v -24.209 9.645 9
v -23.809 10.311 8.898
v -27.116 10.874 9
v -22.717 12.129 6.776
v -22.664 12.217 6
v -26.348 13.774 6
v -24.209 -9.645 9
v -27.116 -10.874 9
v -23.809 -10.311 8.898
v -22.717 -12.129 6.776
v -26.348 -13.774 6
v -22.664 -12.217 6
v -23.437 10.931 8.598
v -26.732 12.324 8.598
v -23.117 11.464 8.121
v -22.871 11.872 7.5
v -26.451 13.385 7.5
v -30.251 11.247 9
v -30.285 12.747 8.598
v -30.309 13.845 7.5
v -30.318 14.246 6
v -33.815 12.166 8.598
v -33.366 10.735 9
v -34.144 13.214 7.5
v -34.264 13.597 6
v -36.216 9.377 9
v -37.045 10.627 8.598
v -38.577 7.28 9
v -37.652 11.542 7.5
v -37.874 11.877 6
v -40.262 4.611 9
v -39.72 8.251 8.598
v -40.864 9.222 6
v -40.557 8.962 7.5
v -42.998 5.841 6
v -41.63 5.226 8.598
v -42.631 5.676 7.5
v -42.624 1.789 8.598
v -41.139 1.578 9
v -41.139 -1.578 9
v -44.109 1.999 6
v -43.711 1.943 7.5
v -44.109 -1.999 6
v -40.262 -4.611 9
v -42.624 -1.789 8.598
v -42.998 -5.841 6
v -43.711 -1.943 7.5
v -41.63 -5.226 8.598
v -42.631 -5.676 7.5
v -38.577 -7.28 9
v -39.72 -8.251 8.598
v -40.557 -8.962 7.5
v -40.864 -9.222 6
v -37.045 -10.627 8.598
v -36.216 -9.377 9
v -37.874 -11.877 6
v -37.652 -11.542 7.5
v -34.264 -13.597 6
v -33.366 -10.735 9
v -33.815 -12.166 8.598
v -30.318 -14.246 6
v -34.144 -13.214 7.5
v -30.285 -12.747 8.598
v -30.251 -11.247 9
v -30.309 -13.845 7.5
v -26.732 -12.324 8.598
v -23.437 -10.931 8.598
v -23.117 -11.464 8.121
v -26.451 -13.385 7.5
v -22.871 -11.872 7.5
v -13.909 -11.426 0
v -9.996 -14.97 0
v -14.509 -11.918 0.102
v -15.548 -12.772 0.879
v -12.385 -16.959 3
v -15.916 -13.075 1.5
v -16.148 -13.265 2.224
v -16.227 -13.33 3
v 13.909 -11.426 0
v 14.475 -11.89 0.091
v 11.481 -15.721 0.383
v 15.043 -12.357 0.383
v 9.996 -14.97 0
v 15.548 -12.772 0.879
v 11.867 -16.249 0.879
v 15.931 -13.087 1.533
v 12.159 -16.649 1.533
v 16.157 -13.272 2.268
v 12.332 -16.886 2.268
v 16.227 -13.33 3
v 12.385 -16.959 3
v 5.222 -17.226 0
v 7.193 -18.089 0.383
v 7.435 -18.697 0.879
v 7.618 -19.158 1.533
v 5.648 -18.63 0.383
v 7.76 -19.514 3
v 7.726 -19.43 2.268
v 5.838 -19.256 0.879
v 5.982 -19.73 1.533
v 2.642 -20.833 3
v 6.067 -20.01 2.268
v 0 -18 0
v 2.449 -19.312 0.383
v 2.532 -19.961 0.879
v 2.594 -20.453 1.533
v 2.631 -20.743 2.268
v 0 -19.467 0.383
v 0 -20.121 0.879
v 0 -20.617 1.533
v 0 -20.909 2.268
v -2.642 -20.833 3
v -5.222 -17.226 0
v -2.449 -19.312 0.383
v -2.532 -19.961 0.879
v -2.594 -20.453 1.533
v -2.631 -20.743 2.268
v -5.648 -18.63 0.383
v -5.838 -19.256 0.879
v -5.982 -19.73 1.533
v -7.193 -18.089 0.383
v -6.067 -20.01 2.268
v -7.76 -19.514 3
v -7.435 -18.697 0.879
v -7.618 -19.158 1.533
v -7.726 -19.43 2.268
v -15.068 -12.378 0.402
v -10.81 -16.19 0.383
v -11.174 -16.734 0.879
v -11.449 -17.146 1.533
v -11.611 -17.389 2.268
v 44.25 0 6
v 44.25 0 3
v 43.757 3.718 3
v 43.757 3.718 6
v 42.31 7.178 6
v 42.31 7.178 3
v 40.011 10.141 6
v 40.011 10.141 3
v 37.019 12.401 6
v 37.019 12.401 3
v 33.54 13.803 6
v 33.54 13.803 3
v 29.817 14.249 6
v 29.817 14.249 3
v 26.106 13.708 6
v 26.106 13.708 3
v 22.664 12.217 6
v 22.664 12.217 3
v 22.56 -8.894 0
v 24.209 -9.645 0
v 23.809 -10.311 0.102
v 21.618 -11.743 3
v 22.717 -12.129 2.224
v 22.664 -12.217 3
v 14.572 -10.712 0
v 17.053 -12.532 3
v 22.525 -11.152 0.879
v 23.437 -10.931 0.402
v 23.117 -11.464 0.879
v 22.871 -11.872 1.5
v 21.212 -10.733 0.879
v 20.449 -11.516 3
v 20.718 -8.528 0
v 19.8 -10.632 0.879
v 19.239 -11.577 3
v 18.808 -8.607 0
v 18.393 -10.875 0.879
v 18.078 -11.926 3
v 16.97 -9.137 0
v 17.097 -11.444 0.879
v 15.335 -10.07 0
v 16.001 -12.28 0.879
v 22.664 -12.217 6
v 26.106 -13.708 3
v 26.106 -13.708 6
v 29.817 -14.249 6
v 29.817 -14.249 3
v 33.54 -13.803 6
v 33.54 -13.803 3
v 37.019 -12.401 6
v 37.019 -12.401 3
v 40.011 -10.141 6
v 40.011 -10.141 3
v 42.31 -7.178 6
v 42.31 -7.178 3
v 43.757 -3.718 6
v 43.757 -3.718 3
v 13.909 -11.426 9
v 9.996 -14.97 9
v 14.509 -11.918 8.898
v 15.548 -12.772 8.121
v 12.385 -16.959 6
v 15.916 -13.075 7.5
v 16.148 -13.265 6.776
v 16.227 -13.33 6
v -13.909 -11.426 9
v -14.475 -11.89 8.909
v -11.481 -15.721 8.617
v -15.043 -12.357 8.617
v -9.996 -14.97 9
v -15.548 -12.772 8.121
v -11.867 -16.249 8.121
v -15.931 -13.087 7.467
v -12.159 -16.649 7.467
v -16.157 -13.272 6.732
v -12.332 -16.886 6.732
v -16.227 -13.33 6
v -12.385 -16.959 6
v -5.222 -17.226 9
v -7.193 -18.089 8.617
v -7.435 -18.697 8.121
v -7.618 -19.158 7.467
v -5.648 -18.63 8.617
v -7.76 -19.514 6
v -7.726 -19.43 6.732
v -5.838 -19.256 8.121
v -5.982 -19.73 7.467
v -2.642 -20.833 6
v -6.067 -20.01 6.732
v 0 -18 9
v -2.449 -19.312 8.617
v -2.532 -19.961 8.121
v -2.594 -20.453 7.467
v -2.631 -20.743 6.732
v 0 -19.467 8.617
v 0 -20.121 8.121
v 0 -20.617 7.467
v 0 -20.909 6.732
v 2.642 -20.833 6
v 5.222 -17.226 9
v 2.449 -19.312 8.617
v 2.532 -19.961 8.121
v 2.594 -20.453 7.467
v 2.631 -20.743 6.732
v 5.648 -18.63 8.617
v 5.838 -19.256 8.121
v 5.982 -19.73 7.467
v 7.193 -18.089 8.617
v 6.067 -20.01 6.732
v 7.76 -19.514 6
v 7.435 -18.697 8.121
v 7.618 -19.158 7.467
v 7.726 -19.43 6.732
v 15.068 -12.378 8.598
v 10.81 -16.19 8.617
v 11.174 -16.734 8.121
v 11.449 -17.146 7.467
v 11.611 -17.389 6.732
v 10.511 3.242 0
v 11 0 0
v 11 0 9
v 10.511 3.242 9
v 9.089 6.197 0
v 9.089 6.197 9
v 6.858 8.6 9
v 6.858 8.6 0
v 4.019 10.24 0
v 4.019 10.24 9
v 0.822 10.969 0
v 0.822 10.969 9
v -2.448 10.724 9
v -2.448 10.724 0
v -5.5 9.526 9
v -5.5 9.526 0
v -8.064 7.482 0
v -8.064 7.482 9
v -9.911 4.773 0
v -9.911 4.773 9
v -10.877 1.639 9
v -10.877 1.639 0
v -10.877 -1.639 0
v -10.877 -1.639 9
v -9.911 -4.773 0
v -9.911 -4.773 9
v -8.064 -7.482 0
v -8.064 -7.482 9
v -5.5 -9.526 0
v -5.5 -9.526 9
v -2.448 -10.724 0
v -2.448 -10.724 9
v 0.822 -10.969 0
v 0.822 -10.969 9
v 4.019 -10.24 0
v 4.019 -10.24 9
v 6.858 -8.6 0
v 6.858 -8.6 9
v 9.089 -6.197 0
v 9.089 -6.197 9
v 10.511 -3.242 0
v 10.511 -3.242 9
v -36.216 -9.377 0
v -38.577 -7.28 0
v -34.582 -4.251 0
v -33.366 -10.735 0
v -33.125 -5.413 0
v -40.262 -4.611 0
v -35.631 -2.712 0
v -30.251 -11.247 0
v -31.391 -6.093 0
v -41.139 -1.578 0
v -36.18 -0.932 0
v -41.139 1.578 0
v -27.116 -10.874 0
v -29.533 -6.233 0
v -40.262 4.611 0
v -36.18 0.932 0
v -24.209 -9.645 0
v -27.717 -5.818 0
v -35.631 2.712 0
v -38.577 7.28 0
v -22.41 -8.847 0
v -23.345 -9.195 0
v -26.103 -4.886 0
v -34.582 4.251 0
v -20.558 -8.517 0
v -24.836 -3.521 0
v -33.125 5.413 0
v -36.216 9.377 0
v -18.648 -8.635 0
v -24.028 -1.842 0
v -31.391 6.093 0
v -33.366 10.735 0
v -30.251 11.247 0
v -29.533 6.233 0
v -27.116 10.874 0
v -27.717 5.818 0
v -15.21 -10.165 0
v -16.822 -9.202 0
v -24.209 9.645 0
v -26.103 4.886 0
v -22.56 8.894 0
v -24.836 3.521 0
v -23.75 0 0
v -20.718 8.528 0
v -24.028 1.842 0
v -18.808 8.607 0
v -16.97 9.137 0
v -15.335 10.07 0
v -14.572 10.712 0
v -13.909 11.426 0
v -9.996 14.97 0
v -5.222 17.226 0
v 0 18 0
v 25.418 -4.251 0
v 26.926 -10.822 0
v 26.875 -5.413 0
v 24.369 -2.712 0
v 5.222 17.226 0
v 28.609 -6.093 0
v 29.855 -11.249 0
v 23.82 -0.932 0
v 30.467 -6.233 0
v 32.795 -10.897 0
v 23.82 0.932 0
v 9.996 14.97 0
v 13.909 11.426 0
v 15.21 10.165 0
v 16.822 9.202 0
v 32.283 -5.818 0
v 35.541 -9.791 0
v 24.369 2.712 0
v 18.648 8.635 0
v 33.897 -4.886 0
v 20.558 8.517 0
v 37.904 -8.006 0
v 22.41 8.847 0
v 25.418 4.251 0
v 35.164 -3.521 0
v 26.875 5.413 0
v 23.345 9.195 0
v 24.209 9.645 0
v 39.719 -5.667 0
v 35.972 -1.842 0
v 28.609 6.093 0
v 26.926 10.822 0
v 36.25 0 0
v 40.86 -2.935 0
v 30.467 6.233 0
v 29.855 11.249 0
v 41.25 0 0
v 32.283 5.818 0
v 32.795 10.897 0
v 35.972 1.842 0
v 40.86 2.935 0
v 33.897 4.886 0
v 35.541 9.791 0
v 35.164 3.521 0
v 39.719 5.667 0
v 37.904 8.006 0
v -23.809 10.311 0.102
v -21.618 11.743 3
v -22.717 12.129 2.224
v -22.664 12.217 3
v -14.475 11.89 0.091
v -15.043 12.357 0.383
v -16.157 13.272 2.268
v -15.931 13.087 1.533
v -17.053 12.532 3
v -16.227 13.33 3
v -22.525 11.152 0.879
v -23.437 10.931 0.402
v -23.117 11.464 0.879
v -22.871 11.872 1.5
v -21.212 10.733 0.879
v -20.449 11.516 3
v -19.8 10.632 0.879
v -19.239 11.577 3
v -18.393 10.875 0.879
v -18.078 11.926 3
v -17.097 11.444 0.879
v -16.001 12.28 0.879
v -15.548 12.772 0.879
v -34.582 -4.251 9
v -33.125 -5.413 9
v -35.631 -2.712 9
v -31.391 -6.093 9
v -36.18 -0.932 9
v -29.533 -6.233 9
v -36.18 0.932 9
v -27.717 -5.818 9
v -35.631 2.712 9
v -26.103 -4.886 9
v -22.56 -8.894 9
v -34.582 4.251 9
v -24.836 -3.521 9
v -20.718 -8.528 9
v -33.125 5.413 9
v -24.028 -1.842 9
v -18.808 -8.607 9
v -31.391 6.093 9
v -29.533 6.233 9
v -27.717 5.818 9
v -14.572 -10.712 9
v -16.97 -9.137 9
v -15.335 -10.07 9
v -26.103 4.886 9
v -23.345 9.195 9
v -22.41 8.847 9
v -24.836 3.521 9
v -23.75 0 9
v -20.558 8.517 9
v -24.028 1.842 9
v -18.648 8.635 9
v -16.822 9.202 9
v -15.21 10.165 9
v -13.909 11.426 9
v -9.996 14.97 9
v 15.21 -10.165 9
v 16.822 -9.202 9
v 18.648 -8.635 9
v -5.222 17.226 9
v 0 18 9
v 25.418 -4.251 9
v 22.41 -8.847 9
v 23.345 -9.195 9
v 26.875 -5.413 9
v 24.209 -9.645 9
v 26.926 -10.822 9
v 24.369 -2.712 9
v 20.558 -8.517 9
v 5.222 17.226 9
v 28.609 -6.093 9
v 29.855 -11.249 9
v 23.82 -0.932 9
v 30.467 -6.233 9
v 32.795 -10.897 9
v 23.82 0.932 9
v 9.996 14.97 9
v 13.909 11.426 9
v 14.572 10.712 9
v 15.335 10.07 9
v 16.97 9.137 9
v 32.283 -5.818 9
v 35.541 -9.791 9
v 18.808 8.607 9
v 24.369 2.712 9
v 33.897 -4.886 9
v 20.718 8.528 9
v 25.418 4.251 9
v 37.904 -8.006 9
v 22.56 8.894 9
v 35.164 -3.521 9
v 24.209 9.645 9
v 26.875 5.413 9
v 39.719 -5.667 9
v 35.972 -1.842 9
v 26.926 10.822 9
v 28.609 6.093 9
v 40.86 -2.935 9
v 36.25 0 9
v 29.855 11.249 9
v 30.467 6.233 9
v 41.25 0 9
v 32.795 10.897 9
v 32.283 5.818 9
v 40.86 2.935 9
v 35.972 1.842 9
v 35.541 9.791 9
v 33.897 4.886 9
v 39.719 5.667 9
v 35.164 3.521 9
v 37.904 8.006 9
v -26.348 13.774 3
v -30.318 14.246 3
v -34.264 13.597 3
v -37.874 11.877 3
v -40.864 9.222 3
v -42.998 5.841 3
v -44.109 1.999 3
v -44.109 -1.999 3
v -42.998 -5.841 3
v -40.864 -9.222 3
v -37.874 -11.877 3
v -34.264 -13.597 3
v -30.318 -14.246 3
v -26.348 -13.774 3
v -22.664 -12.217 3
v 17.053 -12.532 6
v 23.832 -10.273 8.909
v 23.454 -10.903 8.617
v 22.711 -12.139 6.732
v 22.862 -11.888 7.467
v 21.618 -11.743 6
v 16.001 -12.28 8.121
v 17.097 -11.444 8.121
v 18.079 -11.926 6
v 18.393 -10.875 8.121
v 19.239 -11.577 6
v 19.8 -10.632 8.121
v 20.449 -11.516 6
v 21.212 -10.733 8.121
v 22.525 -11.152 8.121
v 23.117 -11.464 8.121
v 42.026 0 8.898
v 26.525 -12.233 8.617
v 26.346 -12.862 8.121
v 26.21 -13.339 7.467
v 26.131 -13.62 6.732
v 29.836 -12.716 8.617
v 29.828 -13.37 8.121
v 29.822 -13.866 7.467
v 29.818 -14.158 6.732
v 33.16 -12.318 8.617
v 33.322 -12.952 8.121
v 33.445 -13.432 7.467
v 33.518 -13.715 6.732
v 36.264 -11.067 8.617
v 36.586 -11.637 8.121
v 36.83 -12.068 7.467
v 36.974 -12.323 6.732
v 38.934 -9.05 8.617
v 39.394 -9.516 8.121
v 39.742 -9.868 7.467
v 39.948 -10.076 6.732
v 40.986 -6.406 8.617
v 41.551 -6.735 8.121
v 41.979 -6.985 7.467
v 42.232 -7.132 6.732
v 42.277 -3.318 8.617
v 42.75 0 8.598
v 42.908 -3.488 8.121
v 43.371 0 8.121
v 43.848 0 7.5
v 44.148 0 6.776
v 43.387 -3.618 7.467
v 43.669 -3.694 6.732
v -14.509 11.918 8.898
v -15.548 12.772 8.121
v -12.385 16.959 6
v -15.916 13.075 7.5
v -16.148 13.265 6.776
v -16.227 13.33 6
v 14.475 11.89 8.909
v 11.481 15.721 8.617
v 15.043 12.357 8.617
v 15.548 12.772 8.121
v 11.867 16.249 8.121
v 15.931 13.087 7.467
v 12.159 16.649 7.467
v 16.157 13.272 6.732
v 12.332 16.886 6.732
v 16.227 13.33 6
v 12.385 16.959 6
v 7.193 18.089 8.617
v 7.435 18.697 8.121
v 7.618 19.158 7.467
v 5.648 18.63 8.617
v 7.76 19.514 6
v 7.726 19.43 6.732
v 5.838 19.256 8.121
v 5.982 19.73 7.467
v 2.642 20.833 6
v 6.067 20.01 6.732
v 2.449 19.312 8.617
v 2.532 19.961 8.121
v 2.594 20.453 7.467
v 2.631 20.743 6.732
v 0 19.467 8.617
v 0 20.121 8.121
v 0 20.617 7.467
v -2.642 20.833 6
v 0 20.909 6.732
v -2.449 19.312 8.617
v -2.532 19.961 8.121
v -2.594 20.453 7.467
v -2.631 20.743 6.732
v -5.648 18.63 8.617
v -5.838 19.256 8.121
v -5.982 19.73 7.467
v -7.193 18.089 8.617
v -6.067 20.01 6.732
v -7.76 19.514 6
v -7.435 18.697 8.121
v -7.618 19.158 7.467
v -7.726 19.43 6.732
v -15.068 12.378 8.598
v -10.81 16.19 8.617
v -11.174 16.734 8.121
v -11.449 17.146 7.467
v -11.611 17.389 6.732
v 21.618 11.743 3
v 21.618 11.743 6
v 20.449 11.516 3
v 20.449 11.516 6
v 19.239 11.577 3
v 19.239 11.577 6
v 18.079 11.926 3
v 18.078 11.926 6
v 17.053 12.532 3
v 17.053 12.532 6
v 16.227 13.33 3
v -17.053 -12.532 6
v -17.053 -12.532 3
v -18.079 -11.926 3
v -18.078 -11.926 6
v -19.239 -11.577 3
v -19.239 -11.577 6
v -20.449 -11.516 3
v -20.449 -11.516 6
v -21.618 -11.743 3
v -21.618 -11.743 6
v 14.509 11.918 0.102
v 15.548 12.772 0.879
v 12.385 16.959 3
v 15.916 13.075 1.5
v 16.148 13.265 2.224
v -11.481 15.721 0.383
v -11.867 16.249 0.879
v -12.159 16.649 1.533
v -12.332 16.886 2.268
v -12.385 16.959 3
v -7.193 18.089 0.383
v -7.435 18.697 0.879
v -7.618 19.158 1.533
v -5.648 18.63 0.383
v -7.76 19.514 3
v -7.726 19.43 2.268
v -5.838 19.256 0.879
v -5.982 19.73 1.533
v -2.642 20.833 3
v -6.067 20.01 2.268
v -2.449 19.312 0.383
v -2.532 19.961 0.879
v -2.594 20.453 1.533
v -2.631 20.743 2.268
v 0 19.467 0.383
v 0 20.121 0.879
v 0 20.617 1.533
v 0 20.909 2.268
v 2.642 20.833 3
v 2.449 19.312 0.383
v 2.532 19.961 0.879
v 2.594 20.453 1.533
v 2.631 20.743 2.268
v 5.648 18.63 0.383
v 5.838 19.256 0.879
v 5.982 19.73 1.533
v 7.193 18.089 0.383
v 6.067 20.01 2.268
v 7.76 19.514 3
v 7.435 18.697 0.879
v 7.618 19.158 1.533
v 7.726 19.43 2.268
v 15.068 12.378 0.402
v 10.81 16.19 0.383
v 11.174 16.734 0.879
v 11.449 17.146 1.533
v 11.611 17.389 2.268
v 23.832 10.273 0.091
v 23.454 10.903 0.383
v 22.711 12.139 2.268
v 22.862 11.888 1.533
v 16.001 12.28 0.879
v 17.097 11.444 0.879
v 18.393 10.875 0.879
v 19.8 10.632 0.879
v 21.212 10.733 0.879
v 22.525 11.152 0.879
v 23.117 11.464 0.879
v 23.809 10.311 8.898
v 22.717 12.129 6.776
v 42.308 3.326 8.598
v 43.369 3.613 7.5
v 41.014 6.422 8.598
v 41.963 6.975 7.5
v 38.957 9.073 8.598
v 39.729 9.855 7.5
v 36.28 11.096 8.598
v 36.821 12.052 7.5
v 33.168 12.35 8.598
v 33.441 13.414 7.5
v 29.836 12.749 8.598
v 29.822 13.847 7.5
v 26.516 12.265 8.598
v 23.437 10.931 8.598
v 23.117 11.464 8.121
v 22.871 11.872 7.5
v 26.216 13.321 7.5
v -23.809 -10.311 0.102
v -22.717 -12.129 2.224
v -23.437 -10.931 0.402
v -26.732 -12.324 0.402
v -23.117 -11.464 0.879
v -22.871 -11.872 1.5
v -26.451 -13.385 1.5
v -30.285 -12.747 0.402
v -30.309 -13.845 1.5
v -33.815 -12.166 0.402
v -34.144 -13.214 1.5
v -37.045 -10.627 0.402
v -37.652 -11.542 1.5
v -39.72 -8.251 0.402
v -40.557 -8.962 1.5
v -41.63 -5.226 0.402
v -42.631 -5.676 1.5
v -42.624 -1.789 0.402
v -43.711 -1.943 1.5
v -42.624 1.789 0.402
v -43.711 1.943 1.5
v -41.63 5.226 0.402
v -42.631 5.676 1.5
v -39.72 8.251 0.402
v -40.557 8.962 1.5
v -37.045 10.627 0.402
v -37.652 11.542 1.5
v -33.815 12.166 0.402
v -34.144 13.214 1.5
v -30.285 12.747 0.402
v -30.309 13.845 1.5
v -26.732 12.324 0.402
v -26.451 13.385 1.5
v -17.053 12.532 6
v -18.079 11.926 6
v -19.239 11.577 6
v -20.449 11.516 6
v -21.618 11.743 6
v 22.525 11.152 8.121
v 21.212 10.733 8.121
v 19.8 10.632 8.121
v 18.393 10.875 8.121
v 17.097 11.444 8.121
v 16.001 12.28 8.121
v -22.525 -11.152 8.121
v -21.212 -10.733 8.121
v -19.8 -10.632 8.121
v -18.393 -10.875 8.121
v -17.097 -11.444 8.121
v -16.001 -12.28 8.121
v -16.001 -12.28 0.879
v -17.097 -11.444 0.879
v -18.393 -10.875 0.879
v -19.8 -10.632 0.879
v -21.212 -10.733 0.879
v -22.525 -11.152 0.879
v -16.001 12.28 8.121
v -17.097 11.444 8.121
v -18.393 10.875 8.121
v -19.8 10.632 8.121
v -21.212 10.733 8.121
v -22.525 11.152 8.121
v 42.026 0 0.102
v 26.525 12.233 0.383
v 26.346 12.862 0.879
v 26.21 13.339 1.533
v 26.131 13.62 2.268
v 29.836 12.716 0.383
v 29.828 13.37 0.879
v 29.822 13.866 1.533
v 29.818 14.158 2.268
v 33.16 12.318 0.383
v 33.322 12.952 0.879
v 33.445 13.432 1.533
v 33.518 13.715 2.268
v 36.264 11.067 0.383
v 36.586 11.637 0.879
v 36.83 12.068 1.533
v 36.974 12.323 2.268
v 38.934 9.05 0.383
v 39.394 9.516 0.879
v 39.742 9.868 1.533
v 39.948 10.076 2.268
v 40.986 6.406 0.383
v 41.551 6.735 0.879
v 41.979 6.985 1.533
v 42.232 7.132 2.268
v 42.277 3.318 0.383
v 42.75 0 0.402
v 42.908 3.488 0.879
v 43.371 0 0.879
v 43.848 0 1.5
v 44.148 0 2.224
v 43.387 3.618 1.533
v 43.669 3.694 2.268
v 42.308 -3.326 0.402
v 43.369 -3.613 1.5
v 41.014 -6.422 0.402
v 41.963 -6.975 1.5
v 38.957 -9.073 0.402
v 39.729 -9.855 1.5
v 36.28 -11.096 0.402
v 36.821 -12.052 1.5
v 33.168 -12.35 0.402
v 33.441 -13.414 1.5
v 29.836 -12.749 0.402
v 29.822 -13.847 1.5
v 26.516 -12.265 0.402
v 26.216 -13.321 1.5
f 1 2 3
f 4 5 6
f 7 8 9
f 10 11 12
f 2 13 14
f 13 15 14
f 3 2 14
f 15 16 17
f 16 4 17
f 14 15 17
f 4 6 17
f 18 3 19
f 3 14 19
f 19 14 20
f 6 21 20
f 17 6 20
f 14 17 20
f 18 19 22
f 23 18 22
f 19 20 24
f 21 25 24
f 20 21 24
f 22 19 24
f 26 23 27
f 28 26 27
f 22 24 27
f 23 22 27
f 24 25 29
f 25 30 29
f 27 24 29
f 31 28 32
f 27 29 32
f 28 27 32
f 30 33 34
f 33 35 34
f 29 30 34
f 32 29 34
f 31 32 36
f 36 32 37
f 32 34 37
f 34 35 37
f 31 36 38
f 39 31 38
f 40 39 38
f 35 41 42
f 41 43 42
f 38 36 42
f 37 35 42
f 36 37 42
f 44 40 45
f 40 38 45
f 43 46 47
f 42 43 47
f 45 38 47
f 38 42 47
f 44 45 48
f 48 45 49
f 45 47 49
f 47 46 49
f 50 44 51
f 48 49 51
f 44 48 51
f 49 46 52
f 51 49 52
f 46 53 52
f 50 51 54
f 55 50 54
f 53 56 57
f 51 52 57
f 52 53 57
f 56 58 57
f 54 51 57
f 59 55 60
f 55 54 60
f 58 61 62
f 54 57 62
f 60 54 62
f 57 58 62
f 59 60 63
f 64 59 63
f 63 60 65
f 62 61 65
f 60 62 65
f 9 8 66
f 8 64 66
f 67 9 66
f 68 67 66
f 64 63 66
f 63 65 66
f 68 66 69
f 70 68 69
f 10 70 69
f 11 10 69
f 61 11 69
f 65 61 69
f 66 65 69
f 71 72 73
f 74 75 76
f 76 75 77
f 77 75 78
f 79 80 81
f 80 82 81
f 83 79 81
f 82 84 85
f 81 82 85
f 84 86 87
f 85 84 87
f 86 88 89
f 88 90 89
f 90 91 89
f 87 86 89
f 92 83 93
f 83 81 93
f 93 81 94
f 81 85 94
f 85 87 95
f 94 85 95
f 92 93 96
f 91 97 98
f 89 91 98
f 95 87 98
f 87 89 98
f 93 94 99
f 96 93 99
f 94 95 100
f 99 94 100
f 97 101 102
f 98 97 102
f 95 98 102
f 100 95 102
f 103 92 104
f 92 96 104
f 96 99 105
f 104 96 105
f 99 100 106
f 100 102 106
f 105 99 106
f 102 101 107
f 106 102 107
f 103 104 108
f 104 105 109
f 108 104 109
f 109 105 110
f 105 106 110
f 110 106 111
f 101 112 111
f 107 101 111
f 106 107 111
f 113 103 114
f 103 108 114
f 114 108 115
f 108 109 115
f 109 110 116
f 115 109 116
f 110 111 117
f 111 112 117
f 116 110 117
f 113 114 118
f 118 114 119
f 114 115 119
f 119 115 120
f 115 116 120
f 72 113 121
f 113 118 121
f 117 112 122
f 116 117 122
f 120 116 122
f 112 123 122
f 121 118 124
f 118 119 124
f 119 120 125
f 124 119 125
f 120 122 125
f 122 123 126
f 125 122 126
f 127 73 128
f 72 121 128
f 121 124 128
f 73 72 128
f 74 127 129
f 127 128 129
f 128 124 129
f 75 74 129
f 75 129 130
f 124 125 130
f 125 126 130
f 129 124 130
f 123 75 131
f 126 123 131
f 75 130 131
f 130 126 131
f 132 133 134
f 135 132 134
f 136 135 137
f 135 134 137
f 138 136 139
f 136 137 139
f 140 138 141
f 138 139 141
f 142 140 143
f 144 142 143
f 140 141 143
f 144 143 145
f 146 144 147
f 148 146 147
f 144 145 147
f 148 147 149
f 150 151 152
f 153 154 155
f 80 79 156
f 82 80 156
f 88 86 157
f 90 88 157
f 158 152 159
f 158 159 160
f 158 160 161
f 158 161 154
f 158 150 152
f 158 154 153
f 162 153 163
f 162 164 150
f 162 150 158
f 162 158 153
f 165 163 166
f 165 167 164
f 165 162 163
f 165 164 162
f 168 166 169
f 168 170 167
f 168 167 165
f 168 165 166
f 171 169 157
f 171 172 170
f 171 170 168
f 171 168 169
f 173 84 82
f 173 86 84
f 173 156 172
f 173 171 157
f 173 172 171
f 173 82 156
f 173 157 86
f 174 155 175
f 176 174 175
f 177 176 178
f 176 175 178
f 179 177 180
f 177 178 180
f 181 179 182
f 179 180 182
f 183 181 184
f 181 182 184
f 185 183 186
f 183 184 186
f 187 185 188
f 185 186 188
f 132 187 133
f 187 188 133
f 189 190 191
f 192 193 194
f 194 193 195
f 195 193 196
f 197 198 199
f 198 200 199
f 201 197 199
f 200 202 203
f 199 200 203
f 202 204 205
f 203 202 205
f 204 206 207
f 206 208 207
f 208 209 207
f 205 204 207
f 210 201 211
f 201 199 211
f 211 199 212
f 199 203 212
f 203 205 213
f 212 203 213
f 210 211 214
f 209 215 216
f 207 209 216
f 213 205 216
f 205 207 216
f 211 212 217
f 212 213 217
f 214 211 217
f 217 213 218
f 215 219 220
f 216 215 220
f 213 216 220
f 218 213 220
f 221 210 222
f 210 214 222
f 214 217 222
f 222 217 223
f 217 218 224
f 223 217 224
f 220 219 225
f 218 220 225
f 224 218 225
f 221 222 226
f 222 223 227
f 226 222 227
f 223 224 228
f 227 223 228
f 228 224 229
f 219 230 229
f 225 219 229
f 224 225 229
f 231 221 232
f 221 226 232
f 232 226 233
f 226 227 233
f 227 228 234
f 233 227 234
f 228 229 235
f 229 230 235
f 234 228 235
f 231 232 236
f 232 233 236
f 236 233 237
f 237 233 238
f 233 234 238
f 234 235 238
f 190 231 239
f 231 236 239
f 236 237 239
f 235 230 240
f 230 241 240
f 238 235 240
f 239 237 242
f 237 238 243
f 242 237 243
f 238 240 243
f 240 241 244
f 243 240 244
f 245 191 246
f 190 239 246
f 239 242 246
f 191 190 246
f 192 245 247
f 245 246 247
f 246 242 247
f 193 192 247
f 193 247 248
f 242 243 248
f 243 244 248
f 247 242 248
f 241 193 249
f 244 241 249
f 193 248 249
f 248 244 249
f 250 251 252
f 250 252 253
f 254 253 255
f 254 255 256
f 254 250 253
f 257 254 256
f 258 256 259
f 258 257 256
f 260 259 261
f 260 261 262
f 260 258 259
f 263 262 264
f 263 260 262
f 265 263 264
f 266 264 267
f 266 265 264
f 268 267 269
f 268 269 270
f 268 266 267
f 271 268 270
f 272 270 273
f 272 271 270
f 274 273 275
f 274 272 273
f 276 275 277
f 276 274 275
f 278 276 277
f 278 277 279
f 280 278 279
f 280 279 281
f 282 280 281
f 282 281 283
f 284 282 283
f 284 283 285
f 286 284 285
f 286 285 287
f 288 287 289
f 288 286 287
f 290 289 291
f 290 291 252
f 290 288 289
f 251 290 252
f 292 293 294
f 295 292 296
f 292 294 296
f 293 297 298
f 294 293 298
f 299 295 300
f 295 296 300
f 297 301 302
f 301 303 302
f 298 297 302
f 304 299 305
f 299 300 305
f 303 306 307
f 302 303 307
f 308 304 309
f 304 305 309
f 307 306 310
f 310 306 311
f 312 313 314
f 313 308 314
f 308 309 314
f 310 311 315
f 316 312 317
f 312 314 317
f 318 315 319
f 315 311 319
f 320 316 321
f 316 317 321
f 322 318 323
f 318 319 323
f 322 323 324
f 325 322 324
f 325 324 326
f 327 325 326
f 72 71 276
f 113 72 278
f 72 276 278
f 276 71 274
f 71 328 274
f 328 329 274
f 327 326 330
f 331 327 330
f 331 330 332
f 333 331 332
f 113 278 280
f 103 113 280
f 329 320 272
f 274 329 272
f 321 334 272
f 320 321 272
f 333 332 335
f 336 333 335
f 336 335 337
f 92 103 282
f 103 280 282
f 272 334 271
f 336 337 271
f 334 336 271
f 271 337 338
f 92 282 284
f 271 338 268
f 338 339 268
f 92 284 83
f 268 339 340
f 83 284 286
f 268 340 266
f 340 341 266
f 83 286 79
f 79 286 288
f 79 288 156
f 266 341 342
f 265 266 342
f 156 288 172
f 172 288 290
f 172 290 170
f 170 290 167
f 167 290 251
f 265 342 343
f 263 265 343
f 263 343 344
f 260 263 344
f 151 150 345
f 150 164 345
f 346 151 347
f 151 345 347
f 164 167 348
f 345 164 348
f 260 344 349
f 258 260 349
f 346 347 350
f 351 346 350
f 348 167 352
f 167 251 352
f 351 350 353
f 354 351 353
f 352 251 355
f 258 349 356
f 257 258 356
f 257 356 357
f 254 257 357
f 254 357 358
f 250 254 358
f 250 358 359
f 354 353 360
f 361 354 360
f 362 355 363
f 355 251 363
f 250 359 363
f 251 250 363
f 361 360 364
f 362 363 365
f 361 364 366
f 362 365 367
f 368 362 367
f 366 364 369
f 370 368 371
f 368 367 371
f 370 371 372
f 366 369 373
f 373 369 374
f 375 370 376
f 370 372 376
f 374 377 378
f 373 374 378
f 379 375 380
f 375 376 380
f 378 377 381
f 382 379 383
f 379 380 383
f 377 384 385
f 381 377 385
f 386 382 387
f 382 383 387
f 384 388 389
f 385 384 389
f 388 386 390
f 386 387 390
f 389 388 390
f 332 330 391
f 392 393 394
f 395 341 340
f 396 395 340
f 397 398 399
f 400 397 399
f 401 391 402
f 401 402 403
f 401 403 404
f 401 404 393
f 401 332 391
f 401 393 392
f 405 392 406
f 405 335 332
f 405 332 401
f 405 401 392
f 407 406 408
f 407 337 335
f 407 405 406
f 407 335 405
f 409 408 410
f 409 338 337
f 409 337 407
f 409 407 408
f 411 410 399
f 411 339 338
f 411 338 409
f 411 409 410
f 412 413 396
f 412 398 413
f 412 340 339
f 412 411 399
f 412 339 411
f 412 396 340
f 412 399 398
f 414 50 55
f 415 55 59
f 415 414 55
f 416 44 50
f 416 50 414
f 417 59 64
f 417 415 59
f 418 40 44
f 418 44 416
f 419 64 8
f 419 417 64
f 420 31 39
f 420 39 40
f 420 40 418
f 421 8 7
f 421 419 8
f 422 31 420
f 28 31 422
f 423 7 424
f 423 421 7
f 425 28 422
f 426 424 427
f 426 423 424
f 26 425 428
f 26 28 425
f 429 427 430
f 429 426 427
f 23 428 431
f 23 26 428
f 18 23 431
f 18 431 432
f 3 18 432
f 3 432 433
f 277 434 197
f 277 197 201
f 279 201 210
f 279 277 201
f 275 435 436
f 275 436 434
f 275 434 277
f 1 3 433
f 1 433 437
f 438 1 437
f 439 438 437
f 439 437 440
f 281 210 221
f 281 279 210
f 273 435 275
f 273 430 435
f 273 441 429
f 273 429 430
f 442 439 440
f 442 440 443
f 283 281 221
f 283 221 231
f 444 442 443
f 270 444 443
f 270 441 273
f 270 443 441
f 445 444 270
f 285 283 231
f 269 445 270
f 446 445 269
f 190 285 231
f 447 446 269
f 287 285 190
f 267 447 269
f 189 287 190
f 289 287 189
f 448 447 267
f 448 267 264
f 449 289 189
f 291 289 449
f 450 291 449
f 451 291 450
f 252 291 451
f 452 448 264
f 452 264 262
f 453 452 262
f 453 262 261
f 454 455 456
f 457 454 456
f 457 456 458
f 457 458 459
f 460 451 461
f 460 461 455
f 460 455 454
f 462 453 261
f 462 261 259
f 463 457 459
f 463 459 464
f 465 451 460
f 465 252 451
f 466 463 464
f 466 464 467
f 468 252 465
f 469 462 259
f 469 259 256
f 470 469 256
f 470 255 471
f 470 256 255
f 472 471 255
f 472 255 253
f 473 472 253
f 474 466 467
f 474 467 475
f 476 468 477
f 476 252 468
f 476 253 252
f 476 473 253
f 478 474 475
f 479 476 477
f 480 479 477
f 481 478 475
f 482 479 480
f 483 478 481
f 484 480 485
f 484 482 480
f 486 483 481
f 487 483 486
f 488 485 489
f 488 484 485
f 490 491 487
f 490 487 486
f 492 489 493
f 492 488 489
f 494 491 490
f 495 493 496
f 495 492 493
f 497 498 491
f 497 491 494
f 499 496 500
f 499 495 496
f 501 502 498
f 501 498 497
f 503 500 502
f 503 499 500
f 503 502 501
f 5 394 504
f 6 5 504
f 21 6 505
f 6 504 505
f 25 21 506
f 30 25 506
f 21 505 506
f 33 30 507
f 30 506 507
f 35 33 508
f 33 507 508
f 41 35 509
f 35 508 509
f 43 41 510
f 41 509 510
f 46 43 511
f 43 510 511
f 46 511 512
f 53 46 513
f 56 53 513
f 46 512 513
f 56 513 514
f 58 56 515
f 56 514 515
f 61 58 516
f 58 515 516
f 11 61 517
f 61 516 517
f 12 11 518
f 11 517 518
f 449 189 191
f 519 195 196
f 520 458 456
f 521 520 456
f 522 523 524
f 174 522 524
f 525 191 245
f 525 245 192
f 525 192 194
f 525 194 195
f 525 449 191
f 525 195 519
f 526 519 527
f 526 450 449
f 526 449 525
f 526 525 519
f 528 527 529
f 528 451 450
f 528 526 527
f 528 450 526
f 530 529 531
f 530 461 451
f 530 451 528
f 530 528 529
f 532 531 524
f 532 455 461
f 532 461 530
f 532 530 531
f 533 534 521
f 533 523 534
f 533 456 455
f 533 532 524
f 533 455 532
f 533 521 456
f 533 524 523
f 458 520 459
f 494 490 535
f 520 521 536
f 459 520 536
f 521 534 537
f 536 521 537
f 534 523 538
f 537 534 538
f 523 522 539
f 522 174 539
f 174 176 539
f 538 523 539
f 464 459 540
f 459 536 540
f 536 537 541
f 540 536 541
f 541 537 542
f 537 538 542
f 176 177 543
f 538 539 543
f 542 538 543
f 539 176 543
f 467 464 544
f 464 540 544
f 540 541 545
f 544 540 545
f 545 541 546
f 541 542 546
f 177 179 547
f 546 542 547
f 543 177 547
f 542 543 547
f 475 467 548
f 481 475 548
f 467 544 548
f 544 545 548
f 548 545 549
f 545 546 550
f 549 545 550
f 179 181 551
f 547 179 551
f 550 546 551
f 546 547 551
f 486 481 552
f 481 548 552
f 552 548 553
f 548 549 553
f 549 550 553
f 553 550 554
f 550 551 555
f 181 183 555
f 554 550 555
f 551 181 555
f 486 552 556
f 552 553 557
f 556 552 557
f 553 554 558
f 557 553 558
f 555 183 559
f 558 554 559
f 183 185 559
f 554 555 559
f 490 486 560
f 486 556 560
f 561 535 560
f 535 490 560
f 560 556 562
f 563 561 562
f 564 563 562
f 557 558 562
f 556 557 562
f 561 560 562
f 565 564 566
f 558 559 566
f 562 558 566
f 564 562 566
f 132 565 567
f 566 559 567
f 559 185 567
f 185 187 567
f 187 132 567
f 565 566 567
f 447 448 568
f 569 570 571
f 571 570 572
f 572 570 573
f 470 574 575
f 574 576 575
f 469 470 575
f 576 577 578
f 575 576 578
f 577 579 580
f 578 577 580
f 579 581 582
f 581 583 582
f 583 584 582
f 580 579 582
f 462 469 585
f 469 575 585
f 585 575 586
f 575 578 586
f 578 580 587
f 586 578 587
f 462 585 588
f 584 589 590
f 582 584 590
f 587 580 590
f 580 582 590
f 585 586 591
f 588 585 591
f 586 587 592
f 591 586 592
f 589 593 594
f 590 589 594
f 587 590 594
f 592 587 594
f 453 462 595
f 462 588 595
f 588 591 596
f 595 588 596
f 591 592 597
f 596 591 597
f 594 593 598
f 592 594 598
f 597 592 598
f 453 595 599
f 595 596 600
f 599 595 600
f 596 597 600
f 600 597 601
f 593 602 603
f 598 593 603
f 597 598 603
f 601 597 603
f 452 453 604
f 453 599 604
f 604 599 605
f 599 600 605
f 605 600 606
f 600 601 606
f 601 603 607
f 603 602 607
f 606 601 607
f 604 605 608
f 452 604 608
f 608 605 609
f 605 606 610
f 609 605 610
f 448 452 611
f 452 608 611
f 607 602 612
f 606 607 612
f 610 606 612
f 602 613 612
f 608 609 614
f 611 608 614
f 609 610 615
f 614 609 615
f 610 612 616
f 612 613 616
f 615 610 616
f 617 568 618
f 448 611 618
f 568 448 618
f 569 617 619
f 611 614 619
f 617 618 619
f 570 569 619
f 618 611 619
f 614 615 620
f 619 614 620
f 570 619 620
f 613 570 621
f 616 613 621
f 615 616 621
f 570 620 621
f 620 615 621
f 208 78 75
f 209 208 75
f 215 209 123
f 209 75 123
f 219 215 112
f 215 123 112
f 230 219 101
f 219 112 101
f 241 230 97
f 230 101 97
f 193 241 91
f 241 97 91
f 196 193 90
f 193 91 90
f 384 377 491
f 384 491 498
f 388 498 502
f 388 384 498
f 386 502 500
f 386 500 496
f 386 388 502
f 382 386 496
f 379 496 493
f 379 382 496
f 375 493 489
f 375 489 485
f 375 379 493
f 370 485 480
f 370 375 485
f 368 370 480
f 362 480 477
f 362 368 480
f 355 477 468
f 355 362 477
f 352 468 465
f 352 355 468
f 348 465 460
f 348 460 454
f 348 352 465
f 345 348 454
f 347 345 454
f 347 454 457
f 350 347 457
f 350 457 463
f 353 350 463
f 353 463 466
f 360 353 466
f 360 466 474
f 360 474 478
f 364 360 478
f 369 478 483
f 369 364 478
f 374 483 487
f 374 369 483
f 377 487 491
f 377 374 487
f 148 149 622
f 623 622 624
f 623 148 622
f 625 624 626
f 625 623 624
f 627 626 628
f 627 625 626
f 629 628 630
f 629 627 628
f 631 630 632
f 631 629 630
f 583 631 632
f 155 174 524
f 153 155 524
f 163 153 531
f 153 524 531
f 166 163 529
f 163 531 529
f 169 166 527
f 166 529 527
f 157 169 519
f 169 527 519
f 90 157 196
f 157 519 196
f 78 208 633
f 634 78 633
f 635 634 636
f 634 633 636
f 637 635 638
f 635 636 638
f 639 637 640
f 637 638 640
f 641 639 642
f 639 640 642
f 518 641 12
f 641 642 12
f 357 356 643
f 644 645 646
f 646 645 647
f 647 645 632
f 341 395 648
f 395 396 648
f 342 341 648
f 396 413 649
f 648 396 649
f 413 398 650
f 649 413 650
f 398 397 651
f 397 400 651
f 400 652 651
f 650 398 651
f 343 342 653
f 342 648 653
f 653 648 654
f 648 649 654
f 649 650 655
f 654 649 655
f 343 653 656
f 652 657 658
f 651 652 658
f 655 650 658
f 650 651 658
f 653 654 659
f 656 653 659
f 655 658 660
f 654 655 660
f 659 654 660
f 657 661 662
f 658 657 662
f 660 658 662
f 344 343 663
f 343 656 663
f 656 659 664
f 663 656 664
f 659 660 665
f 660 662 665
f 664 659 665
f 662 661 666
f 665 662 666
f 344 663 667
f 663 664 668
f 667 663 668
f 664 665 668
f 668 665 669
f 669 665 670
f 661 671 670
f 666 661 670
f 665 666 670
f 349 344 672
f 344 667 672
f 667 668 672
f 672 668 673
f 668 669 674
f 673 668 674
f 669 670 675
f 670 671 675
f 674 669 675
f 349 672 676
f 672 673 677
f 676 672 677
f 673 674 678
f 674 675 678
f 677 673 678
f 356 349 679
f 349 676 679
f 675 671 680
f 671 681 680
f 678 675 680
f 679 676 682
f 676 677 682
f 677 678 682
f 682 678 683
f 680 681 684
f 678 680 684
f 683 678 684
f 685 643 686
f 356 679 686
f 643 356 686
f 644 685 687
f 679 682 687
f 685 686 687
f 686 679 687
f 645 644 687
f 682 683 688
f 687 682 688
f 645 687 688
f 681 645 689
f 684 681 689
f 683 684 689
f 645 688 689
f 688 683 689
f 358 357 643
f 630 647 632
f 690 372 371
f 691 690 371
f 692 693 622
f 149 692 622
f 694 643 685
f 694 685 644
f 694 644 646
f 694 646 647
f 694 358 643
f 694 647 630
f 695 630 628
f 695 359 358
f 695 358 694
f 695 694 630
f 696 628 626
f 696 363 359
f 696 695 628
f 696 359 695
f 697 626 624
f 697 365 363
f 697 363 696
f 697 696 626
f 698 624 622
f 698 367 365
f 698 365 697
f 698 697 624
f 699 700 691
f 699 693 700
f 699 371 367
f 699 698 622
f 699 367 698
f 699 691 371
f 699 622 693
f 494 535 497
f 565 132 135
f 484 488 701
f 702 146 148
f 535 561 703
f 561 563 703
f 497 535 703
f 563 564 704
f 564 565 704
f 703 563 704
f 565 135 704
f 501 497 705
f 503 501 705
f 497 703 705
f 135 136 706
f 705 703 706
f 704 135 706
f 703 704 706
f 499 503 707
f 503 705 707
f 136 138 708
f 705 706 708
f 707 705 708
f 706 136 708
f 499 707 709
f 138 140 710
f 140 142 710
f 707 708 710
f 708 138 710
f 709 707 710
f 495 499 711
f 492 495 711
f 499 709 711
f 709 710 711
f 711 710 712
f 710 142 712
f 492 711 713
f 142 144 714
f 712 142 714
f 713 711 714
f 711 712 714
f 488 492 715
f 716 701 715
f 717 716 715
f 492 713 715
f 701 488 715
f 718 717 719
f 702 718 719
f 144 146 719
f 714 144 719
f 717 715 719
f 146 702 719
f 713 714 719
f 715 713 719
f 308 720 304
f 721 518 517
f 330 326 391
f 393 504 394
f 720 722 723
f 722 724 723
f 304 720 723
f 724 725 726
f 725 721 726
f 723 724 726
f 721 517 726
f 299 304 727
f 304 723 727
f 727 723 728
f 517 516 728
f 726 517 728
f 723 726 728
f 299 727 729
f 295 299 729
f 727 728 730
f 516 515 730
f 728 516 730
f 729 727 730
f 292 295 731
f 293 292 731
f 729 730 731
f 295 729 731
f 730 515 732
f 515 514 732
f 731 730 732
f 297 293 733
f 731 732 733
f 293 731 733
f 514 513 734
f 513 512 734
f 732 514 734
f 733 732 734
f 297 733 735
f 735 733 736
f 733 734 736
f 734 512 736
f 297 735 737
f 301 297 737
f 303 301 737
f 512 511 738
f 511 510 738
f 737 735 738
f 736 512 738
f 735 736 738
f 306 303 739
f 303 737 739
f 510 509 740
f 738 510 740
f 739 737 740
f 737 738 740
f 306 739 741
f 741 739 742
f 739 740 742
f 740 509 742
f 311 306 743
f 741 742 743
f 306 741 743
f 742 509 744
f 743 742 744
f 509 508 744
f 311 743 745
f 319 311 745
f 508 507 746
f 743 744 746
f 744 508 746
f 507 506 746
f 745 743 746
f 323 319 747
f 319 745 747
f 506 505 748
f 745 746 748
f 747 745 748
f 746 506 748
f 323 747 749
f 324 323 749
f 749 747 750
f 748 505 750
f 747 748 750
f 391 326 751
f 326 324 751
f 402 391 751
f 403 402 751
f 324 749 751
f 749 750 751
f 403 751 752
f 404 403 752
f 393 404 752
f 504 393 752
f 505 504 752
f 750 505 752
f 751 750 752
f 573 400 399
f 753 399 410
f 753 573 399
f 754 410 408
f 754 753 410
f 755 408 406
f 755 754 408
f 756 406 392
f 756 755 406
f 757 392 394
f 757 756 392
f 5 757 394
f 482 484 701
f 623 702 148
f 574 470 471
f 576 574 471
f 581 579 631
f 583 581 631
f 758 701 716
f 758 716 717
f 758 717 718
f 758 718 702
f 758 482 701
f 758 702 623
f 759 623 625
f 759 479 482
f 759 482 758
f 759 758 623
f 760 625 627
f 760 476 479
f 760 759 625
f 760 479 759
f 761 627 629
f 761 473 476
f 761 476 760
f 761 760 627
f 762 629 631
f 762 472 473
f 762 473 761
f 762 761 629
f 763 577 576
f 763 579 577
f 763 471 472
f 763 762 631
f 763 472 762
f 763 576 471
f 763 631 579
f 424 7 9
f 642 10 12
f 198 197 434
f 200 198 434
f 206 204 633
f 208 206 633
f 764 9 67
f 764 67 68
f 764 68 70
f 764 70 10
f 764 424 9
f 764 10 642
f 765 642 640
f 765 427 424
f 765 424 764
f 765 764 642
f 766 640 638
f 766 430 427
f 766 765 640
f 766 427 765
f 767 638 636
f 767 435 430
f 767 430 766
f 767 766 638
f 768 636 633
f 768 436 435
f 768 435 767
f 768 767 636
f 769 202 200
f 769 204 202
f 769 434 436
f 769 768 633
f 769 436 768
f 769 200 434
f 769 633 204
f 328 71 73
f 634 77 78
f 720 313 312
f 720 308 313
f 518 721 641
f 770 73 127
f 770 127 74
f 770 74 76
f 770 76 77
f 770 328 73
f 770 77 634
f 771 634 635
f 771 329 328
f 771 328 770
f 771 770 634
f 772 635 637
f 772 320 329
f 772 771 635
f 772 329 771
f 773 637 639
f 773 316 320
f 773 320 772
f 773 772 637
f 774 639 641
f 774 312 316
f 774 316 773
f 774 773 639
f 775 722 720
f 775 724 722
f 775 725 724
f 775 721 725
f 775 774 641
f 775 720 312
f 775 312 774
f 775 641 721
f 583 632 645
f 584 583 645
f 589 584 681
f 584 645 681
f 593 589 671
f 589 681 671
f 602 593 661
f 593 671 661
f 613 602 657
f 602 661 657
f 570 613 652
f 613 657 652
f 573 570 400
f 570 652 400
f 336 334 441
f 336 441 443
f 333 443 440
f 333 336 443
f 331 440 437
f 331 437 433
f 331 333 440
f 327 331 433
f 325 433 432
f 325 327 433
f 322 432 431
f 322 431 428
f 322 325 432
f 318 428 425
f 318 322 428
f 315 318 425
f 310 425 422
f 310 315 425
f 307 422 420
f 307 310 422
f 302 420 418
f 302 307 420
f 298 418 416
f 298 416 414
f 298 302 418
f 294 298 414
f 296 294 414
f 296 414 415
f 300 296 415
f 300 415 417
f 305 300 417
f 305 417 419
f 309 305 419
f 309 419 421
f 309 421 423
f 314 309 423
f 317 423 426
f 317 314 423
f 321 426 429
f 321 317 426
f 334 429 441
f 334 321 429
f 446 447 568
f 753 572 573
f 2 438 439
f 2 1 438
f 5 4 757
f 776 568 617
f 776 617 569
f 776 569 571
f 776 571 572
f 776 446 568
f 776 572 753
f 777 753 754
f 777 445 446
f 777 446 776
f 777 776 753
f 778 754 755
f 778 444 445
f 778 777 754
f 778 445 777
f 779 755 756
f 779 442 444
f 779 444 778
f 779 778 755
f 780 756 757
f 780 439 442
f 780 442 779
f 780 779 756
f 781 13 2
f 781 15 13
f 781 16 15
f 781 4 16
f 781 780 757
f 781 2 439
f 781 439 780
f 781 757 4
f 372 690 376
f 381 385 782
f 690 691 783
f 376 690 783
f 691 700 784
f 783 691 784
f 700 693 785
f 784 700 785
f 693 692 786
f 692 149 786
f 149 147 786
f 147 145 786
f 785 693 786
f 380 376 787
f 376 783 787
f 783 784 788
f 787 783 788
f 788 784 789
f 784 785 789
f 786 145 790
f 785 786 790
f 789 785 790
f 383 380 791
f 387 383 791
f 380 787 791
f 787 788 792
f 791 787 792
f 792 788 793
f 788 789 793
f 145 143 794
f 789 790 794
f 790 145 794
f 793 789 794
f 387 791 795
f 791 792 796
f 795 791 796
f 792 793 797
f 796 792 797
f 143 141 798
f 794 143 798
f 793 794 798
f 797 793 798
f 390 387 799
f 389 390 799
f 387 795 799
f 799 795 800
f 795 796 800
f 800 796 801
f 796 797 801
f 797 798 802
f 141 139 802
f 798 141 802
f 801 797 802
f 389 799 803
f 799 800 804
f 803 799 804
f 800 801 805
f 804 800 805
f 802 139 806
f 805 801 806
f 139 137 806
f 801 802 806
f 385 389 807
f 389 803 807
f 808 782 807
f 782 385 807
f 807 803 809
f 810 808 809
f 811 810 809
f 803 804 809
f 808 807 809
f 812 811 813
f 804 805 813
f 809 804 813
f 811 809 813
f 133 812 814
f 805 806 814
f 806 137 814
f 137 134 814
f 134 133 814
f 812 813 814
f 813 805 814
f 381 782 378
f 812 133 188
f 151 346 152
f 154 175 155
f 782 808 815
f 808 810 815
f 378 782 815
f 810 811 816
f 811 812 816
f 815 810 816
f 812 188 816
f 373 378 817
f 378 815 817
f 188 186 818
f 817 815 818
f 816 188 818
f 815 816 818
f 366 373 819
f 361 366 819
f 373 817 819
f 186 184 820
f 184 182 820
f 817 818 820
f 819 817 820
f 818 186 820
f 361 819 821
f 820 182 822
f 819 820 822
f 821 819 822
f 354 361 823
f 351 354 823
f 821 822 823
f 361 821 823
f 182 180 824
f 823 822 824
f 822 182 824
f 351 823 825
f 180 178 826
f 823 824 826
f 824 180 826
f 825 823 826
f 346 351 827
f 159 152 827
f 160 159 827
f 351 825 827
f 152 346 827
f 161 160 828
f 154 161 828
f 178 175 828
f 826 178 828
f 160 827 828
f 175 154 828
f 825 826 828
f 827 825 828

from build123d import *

# Parameters (mm, degrees)
F0_R     = 6.25
F0_R_2   = 11
F1_DEPTH = 9
F2_R     = 5
F3_R     = 3
F4_R     = 3


with BuildPart() as f1:
    # F0 (on Top) → F1 (new body)
    with BuildSketch(Plane.XY):
        with BuildLine():
            ThreePointArc((18.965625, 9.0169323142), (20.4850936659, 4.6217894262), (21, 0))
            ThreePointArc((21, 0), (20.4850936659, -4.6217894262), (18.965625, -9.0169323142))
            ThreePointArc((18.965625, -9.0169323142), (34.7865779138, -13.4220405258), (44.25, 0))
            ThreePointArc((44.25, 0), (34.7865779138, 13.4220405258), (18.965625, 9.0169323142))
        make_face()
        with Locations((30, 0)):
            Circle(F0_R, mode=Mode.SUBTRACT)
        with BuildLine():
            ThreePointArc((-15.75, 0), (-16.5779594742, 4.7865779138), (-18.965625, 9.0169323142))
            ThreePointArc((-18.965625, 9.0169323142), (-21, 0), (-18.965625, -9.0169323142))
            ThreePointArc((-18.965625, -9.0169323142), (-16.5779594742, -4.7865779138), (-15.75, 0))
        make_face()
        with BuildLine():
            ThreePointArc((18.965625, -9.0169323142), (20.4850936659, -4.6217894262), (21, 0))
            ThreePointArc((21, 0), (20.4850936659, 4.6217894262), (18.965625, 9.0169323142))
            ThreePointArc((18.965625, 9.0169323142), (15.75, 0), (18.965625, -9.0169323142))
        make_face()
        with BuildLine():
            ThreePointArc((18.965625, -9.0169323142), (15.75, 0), (18.965625, 9.0169323142))
            ThreePointArc((18.965625, 9.0169323142), (0, 21), (-18.965625, 9.0169323142))
            ThreePointArc((-18.965625, 9.0169323142), (-16.5779594742, 4.7865779138), (-15.75, 0))
            ThreePointArc((-15.75, 0), (-16.5779594742, -4.7865779138), (-18.965625, -9.0169323142))
            ThreePointArc((-18.965625, -9.0169323142), (0, -21), (18.965625, -9.0169323142))
        make_face()
        Circle(F0_R_2, mode=Mode.SUBTRACT)
        with BuildLine():
            ThreePointArc((-18.965625, -9.0169323142), (-21, 0), (-18.965625, 9.0169323142))
            ThreePointArc((-18.965625, 9.0169323142), (-44.25, 0), (-18.965625, -9.0169323142))
        make_face()
        with Locations((-30, 0)):
            Circle(F0_R, mode=Mode.SUBTRACT)
    extrude(amount=F1_DEPTH)

    # F2
    f2_edges = [f1.edges().sort_by_distance(p)[0] for p in [
        (-18.965625, 9.016932, 4.5),
        (18.965625, 9.016932, 4.5),
        (-18.965625, -9.016932, 4.5),
        (18.965625, -9.016932, 4.5),
    ]]
    fillet(f2_edges, radius=F2_R)

    # F3
    f3_edges = [f1.edges().sort_by_distance(p)[0] for p in [
        (-44.25, 0, 9),
        (-19.238882, 11.576619, 9),
        (0, 21, 9),
        (19.238882, 11.576619, 9),
        (44.25, 0, 9),
        (19.238882, -11.576619, 9),
        (0, -21, 9),
        (-19.238882, -11.576619, 9),
    ]]
    fillet(f3_edges, radius=F3_R)

    # F4
    f4_edges = [f1.edges().sort_by_distance(p)[0] for p in [
        (-19.238882, -11.576619, 0),
        (-44.25, 0, 0),
        (-19.238882, 11.576619, 0),
        (0, 21, 0),
        (19.238882, 11.576619, 0),
        (44.25, 0, 0),
        (0, -21, 0),
        (19.238882, -11.576619, 0),
    ]]
    fillet(f4_edges, radius=F4_R)


solid = f1.part
